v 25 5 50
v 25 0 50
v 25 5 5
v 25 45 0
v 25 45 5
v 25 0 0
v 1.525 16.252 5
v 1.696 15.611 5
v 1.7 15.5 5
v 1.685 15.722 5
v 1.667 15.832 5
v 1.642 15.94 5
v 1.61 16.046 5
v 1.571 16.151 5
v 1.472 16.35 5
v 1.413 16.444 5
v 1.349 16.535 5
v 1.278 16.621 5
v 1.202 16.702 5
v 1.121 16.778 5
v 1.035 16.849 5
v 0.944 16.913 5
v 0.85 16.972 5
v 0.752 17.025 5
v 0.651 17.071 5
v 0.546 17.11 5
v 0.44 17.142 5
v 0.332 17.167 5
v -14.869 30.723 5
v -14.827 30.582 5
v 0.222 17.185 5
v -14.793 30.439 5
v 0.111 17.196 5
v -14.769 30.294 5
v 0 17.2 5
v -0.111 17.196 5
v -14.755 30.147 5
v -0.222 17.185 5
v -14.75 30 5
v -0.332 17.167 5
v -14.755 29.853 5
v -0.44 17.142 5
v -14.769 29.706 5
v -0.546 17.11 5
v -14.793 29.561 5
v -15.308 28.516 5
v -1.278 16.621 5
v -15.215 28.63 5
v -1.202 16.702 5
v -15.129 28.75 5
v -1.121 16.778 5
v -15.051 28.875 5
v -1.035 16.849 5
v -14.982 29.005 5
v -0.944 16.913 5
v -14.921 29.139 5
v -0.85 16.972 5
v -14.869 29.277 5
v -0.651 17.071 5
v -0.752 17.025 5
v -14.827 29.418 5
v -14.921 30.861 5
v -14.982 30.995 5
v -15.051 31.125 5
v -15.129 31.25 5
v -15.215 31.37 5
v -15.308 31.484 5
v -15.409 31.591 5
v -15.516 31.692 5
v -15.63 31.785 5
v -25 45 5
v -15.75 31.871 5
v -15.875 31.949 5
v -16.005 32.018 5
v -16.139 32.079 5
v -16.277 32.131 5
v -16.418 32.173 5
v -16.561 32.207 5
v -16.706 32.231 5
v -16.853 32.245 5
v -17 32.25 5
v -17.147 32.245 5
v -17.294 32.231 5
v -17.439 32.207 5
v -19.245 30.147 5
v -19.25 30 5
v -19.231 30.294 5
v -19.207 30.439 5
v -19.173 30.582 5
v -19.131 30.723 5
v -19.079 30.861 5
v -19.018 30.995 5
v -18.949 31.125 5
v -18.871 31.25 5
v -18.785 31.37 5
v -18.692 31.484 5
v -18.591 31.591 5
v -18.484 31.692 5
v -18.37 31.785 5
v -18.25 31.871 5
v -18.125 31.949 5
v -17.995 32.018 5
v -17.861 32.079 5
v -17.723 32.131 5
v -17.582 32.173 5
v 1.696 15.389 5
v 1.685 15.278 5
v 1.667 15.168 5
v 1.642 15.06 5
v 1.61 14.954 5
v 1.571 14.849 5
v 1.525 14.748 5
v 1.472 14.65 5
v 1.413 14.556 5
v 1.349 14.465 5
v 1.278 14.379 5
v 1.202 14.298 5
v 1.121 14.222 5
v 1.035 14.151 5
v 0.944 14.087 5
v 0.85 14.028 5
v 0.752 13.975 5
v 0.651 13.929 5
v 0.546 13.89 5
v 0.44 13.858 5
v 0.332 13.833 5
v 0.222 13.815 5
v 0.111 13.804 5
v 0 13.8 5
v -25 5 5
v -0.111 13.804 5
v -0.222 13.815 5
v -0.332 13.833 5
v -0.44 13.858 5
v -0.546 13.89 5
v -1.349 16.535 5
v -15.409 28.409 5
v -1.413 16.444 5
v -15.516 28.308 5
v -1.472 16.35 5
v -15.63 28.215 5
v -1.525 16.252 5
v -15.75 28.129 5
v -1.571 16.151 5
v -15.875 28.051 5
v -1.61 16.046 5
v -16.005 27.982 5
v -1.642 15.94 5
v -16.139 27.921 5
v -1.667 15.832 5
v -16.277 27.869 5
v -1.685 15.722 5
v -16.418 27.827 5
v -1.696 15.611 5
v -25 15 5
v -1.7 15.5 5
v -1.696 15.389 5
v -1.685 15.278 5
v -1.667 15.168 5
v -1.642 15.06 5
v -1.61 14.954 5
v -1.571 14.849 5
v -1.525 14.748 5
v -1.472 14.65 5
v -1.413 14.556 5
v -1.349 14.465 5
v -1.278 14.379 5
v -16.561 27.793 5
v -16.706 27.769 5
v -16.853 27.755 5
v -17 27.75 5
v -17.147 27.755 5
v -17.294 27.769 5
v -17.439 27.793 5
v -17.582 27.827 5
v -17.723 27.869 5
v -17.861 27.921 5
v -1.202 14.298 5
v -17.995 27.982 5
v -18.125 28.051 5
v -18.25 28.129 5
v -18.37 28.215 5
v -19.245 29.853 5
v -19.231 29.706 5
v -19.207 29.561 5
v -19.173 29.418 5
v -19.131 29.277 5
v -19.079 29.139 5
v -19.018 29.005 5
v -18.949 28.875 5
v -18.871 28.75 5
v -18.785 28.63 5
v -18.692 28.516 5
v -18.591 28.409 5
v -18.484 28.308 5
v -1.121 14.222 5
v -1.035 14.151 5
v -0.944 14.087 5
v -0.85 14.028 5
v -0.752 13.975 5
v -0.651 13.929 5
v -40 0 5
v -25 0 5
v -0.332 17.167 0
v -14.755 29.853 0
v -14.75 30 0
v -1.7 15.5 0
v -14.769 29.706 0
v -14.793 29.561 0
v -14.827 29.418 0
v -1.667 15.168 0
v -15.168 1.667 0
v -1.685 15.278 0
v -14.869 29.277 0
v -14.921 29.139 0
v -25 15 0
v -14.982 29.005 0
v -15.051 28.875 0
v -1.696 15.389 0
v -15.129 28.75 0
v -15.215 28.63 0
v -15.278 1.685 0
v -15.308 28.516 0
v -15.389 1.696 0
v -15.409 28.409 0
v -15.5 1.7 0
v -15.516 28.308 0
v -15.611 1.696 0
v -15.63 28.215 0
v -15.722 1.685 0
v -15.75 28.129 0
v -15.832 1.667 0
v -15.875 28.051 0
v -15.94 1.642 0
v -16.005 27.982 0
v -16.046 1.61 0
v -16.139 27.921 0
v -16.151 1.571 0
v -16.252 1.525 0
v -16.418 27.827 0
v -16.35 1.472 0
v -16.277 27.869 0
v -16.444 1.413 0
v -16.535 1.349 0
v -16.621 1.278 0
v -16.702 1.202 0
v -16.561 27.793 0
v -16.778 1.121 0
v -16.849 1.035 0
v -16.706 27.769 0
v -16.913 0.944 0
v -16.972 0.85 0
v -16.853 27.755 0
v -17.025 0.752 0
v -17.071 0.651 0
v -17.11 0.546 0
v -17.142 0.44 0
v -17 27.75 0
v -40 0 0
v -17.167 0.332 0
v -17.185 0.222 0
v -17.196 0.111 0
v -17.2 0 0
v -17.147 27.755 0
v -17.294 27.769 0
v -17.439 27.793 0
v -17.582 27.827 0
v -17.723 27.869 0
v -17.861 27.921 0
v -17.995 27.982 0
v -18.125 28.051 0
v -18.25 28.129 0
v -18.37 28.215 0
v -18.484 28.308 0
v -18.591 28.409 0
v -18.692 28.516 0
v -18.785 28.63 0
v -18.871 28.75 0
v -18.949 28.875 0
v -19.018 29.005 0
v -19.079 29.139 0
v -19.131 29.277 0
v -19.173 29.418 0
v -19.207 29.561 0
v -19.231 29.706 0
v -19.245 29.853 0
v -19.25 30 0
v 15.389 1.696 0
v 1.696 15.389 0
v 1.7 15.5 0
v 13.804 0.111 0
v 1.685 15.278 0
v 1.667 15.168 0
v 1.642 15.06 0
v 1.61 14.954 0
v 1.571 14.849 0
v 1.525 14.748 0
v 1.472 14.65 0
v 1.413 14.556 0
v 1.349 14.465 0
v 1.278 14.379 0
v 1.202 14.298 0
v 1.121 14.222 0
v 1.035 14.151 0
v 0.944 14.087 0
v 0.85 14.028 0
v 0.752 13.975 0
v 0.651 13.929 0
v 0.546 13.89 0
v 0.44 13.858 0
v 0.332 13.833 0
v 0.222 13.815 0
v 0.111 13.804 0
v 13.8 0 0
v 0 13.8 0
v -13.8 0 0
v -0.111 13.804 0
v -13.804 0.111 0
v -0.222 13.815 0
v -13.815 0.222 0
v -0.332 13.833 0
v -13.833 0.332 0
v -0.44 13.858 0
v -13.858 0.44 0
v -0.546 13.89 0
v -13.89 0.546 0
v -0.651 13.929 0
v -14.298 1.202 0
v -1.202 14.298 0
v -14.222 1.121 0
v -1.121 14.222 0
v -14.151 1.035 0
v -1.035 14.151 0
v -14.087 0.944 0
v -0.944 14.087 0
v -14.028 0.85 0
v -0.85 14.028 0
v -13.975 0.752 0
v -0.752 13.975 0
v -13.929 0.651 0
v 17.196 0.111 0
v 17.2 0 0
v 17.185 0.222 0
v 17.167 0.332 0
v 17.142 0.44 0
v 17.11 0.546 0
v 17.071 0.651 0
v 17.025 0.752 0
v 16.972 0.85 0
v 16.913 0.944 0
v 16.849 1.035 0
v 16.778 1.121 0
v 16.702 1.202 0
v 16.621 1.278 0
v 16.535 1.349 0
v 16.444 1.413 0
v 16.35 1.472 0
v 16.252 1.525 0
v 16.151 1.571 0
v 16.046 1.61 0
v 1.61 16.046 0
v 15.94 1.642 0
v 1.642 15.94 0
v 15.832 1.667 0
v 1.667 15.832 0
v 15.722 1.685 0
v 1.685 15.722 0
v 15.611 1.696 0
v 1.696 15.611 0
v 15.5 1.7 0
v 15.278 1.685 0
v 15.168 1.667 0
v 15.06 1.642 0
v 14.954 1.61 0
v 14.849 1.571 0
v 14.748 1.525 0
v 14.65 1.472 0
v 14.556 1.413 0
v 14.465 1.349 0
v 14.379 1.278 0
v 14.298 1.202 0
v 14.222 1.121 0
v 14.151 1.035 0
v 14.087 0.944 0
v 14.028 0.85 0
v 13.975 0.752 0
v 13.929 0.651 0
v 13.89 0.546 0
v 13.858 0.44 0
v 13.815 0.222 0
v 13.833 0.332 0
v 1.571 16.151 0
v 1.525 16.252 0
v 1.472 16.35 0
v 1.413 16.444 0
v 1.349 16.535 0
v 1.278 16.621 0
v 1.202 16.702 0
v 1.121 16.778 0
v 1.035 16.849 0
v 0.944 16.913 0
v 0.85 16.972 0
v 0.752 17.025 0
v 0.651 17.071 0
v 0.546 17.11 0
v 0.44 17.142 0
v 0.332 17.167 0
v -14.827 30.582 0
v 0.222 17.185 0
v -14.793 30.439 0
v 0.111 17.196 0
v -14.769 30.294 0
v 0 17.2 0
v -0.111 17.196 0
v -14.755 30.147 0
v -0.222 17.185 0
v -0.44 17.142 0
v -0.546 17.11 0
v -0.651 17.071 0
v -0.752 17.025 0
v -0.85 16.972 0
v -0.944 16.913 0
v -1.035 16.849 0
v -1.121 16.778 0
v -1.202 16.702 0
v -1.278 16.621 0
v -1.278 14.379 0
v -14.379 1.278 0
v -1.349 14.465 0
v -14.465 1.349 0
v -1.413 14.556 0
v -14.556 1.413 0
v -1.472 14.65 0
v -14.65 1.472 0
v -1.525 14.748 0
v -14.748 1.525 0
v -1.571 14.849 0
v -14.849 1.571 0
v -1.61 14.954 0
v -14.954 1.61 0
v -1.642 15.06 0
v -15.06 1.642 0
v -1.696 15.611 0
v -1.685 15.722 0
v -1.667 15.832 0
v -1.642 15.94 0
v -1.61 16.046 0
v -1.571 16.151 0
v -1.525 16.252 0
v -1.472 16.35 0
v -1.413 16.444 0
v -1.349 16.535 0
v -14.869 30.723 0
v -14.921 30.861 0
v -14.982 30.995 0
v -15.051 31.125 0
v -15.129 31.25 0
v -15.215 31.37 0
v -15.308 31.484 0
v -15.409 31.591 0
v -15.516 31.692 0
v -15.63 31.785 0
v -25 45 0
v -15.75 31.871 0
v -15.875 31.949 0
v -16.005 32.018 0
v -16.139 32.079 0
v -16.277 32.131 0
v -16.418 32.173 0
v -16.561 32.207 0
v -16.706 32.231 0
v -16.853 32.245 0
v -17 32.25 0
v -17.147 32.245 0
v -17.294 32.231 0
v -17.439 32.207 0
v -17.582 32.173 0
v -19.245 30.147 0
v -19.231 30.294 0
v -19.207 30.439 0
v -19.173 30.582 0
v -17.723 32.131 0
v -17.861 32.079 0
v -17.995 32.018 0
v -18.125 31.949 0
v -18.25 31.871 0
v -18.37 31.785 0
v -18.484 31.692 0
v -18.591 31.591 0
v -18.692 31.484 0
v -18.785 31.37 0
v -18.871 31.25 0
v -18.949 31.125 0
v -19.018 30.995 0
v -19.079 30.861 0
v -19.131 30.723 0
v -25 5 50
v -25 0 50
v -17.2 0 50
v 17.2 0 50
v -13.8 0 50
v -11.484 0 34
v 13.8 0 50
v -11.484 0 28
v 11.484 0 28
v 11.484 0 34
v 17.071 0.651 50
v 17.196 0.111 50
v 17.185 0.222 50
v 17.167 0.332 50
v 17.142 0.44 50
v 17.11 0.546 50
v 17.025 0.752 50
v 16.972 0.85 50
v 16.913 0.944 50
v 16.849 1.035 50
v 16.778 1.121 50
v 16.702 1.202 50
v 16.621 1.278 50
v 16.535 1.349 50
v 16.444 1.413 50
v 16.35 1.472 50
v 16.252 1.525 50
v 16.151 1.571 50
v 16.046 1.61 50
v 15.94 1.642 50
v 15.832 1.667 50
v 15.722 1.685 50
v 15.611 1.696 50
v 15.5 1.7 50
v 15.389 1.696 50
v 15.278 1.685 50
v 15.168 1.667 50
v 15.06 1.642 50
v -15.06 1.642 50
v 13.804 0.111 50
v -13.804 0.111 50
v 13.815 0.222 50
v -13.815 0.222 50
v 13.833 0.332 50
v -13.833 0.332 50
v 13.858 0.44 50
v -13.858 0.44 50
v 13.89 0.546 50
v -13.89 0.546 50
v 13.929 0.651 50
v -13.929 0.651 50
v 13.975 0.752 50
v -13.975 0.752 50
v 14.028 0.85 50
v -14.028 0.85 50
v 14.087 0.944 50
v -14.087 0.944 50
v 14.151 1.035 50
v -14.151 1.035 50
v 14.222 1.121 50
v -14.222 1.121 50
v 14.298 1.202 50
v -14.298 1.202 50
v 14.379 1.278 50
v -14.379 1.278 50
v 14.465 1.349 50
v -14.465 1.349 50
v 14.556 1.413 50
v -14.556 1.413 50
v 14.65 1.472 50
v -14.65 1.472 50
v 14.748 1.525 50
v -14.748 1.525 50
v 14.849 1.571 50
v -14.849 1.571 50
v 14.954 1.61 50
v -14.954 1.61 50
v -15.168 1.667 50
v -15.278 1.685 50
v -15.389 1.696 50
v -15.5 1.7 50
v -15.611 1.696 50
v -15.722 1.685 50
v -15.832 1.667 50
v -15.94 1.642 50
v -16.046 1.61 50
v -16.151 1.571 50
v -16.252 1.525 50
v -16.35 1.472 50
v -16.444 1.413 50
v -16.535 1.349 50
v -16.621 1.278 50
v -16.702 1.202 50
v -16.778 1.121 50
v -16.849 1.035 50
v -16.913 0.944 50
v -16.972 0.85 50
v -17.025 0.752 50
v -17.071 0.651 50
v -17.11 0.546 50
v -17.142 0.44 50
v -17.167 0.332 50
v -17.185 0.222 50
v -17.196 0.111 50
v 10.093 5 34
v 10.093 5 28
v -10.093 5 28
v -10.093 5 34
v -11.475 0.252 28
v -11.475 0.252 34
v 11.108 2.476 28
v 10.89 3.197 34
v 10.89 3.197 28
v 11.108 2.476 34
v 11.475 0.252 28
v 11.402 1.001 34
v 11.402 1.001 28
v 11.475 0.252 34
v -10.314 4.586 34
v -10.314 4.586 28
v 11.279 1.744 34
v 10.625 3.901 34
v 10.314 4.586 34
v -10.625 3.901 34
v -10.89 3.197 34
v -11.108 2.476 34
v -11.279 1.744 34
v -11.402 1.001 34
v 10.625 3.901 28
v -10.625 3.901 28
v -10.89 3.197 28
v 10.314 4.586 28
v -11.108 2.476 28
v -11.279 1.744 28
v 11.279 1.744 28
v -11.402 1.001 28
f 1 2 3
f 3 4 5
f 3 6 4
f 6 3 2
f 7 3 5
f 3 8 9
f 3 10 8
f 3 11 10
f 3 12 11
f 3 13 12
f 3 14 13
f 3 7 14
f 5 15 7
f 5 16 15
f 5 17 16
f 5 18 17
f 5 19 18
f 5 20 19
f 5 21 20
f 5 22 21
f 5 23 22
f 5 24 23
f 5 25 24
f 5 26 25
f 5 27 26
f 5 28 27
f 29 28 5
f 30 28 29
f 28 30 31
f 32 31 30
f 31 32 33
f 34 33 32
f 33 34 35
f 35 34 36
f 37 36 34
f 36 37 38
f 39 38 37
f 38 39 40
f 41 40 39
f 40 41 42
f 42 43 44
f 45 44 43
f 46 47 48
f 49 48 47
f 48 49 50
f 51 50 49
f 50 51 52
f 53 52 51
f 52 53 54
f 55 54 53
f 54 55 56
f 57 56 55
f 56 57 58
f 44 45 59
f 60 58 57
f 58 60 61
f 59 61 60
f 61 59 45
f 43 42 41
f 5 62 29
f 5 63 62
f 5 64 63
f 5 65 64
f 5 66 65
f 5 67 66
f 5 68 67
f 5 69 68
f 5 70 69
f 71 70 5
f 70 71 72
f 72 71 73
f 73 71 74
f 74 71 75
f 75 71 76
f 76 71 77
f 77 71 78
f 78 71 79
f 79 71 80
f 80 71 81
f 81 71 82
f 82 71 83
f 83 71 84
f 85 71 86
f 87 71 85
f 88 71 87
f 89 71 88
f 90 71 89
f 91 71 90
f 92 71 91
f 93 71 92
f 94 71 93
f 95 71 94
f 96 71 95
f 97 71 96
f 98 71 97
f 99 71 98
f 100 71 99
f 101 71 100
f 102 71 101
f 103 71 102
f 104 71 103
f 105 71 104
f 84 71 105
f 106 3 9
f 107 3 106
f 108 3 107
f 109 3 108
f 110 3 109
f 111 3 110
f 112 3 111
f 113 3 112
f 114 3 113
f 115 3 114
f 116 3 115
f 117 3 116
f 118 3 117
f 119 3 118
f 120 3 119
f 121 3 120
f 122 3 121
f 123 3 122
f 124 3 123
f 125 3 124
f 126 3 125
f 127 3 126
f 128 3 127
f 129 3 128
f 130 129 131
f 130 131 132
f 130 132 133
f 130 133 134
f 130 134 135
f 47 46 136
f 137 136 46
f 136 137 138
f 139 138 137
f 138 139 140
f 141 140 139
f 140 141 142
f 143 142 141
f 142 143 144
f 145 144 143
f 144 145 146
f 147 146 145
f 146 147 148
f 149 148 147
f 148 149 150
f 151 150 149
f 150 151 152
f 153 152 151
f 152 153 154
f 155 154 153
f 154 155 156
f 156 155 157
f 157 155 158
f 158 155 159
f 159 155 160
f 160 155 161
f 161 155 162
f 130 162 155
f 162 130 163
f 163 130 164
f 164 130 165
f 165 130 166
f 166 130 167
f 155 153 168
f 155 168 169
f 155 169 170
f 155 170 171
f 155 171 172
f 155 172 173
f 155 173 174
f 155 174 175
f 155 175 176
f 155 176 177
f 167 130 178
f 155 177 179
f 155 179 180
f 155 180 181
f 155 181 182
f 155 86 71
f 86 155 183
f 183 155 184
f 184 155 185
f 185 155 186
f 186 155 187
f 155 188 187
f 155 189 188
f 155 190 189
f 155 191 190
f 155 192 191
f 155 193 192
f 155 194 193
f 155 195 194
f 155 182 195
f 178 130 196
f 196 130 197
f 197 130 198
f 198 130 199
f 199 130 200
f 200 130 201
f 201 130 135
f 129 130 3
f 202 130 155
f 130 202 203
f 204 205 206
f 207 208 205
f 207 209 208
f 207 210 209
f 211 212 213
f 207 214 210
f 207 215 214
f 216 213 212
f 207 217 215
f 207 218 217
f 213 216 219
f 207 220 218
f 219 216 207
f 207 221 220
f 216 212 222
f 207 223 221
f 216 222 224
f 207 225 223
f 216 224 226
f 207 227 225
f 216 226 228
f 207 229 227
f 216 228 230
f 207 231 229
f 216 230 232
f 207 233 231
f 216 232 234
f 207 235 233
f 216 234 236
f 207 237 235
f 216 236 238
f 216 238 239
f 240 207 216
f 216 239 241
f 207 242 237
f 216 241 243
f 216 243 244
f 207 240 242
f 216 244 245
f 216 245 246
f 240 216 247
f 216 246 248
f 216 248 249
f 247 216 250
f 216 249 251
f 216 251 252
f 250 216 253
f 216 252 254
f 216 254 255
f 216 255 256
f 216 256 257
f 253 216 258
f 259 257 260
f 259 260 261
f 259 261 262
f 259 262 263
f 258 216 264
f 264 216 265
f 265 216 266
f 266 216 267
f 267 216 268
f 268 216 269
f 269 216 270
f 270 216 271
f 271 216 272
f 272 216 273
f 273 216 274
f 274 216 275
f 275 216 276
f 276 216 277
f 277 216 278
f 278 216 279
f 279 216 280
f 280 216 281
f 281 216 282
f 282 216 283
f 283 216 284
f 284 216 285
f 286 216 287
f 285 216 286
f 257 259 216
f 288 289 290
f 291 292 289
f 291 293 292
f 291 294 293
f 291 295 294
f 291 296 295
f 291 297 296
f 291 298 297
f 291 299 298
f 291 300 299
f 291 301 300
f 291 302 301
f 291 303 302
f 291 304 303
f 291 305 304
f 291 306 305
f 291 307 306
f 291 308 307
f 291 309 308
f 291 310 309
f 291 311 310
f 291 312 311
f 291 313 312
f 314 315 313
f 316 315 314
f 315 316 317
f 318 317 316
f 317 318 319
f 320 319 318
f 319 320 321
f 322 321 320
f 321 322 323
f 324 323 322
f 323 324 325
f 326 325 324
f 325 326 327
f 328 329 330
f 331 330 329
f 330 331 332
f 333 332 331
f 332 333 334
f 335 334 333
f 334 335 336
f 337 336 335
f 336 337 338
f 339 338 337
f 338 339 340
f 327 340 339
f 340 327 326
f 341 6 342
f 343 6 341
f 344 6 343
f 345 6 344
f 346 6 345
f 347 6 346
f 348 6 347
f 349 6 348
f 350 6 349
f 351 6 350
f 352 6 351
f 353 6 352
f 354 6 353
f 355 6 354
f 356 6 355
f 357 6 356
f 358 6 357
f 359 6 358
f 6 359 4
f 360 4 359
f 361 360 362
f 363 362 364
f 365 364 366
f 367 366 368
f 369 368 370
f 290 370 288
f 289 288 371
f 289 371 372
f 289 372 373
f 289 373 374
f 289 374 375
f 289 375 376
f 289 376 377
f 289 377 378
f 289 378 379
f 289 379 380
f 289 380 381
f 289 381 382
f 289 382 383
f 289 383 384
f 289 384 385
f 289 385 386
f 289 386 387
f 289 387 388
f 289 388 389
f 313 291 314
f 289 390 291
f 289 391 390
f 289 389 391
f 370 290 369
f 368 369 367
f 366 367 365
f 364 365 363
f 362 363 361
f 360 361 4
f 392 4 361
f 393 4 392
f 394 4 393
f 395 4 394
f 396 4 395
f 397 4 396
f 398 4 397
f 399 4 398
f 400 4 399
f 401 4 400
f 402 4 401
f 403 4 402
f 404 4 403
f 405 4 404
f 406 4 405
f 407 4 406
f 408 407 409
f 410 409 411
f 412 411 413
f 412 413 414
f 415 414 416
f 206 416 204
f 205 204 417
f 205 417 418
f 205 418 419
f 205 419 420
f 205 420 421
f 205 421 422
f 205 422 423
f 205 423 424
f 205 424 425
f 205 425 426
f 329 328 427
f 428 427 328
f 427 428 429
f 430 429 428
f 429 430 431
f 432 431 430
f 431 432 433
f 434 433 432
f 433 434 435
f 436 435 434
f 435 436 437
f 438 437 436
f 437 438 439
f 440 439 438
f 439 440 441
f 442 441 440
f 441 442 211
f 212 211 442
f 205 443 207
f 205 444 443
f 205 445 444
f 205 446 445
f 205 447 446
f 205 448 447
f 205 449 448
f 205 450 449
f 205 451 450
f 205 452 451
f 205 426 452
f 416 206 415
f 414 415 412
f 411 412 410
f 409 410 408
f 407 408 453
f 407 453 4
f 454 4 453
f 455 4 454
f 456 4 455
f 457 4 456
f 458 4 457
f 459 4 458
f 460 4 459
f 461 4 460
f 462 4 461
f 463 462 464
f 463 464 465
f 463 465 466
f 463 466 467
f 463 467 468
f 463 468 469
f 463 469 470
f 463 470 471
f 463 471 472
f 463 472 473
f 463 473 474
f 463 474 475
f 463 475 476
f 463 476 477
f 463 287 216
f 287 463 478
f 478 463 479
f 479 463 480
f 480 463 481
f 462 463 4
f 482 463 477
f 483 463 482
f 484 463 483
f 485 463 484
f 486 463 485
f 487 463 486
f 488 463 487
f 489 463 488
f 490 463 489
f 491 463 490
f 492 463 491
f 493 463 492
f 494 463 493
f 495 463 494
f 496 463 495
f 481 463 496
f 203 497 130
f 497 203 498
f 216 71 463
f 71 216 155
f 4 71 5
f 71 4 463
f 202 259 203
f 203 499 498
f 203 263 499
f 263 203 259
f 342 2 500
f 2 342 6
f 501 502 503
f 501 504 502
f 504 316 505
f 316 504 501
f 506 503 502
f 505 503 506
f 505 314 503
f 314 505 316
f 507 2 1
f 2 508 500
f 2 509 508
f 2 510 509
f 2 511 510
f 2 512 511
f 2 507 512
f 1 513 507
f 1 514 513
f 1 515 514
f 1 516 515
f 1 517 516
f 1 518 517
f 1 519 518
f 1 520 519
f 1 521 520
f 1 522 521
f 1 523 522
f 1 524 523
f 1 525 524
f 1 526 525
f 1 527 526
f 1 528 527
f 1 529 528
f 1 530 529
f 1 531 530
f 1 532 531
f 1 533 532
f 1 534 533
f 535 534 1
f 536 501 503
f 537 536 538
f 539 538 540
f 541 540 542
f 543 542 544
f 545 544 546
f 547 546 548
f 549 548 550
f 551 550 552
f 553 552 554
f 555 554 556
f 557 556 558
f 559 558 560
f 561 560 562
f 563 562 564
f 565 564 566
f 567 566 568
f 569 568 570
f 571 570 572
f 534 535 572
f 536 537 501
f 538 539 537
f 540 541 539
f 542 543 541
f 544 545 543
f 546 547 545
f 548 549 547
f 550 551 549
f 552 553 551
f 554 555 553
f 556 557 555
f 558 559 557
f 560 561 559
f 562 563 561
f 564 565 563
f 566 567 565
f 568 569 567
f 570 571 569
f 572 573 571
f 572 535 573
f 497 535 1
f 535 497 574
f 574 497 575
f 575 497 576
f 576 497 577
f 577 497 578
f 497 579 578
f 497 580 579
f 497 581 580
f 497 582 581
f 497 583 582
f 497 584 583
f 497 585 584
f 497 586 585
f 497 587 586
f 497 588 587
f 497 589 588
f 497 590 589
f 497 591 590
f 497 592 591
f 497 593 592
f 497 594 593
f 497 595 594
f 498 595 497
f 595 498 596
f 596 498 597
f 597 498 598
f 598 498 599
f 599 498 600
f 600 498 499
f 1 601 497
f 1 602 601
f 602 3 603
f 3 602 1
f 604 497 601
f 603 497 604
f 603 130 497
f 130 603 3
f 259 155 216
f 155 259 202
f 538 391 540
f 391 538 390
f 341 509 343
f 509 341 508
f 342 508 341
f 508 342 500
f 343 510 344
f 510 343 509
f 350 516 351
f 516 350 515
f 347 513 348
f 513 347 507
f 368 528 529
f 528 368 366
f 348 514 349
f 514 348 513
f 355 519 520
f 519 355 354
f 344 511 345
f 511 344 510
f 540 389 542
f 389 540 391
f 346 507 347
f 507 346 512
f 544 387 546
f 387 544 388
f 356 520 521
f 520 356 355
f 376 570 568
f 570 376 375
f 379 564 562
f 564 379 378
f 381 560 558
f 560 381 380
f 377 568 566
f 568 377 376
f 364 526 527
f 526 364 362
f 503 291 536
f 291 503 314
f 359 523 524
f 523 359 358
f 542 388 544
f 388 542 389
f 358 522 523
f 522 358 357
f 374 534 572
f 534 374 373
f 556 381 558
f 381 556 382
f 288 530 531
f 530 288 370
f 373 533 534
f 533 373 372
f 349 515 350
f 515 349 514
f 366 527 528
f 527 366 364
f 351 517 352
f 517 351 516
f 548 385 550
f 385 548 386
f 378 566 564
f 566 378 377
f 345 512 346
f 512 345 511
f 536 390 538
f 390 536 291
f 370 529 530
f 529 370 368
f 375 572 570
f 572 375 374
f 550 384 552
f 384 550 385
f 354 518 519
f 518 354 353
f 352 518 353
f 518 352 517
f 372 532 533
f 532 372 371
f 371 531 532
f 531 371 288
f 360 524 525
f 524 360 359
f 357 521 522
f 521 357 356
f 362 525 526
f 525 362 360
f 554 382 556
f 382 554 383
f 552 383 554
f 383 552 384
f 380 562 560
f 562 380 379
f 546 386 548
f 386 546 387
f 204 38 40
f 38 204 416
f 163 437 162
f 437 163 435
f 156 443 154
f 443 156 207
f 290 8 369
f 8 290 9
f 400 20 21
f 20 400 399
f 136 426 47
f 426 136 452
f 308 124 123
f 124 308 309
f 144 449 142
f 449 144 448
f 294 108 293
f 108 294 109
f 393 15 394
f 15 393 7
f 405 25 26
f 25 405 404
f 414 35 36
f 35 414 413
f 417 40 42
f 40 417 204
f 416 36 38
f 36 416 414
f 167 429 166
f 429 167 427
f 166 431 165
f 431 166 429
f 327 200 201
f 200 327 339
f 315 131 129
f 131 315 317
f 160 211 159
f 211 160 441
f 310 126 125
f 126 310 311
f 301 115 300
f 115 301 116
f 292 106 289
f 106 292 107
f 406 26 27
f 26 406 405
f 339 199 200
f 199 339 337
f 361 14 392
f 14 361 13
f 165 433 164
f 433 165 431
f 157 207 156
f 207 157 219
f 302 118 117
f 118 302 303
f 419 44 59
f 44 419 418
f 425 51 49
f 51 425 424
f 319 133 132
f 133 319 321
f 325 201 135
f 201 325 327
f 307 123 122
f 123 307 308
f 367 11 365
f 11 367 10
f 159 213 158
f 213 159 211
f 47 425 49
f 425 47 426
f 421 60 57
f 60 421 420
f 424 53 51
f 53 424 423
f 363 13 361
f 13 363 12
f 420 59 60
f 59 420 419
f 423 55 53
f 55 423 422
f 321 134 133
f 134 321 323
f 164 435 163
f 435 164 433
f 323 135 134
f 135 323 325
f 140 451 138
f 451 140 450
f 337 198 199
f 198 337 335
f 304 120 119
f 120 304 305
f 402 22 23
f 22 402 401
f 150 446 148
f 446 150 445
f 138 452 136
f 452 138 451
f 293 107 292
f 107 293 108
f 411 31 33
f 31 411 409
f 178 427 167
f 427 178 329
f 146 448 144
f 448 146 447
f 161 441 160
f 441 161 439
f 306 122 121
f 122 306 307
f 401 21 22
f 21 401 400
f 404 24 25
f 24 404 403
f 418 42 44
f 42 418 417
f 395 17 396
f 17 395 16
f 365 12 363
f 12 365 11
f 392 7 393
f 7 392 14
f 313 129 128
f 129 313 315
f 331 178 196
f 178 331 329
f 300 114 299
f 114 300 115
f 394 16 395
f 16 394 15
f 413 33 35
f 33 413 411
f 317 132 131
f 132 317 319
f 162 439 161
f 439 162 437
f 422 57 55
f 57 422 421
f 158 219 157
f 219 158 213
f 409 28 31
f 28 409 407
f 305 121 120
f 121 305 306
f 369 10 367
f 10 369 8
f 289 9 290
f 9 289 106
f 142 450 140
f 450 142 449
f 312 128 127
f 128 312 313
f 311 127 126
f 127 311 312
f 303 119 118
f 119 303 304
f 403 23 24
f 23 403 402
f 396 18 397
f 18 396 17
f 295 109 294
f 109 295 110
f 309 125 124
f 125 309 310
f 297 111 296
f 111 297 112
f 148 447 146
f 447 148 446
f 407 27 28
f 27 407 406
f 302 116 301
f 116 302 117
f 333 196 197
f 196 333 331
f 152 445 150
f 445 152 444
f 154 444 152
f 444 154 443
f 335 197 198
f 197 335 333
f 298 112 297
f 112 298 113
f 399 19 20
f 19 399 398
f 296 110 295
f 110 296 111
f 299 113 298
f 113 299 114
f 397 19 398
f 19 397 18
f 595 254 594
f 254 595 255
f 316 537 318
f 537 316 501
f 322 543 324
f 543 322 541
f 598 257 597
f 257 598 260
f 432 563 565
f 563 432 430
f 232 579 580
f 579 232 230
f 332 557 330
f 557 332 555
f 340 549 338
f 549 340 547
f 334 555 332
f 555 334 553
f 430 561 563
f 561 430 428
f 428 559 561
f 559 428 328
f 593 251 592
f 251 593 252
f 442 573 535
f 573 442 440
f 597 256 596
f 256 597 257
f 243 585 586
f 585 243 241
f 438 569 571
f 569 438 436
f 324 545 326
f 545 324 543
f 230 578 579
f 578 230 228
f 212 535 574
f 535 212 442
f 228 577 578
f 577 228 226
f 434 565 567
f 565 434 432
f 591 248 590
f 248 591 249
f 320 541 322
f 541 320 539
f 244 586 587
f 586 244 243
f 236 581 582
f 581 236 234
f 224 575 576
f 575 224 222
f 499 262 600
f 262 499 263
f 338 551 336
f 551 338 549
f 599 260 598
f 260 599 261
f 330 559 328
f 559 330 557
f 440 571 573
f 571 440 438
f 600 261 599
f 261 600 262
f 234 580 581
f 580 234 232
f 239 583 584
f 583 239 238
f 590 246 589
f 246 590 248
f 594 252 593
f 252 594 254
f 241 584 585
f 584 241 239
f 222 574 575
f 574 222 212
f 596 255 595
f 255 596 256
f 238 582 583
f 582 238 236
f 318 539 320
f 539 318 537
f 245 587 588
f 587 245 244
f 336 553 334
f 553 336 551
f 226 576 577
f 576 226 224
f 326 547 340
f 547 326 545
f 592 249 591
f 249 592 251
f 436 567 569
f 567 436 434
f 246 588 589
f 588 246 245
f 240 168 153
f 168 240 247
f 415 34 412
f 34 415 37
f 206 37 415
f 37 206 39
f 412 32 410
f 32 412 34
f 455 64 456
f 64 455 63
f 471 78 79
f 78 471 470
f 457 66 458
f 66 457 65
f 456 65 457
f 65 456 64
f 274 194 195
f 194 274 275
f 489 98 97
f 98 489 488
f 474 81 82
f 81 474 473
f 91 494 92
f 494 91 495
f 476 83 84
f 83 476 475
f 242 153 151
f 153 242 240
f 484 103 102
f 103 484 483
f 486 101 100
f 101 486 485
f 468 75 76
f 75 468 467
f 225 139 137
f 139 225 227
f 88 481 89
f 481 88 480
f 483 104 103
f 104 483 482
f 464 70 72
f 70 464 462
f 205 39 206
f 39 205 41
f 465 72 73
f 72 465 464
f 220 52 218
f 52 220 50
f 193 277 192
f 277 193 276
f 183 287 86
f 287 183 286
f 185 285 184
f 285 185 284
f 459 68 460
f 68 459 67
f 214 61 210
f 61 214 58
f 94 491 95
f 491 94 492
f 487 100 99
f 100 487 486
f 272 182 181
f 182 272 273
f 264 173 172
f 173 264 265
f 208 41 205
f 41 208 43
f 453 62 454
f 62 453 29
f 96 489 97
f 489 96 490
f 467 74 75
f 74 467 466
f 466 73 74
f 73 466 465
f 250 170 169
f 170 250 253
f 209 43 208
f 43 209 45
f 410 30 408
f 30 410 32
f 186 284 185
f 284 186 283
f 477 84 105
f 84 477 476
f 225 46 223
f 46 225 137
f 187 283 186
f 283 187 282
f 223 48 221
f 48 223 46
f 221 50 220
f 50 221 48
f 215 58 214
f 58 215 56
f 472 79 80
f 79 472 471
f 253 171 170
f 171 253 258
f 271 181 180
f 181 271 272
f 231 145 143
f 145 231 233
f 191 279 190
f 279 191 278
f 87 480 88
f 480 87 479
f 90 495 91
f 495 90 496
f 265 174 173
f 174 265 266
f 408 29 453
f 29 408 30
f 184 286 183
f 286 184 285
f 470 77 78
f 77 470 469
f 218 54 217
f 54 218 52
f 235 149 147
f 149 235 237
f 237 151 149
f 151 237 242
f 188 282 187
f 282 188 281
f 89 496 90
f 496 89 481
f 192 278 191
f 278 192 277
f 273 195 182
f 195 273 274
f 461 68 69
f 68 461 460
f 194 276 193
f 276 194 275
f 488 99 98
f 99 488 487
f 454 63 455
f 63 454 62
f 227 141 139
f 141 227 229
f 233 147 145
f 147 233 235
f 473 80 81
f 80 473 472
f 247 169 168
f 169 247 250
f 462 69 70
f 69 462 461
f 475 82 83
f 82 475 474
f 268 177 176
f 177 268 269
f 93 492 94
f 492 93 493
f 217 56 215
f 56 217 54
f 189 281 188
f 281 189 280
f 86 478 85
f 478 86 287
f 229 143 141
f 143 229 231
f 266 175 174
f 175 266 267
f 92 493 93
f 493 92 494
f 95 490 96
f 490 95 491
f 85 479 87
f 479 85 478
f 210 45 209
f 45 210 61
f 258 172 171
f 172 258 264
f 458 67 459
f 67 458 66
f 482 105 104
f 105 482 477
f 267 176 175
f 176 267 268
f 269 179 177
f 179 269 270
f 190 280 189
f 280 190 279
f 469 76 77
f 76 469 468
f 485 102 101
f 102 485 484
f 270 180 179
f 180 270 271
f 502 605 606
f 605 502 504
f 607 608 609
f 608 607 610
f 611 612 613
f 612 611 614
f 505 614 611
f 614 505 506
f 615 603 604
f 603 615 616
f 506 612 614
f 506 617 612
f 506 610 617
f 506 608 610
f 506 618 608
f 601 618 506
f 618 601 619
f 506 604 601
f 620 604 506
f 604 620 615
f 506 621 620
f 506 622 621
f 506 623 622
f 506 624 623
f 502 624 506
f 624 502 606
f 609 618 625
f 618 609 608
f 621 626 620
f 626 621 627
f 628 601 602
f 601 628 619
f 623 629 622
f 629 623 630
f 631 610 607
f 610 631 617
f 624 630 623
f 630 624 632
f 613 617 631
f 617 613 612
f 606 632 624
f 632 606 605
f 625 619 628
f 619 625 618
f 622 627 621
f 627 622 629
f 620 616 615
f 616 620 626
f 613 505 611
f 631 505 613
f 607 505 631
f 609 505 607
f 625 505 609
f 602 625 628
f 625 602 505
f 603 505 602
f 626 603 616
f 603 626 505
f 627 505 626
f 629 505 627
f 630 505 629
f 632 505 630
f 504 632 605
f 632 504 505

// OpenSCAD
// L-shaped mounting bracket for NEMA 17 stepper motor
// Print orientation: base plate on bed (z = 0), motor plate builds upward (+Z)

// ---------------- Parameters ----------------
base_x0      = -25;    // base plate: x start
base_x1      = 25;     // base plate: x end
base_y0      = 0;      // base plate: y start
base_y1      = 45;     // base plate: y end
base_z0      = 0;      // base plate: z start
base_z1      = 5;      // base plate: z end

hole_x       = -17;    // M4 through-hole x position (base)
hole_y       = 30;     // M4 through-hole y position (base)
hole_d       = 4.5;    // M4 hole diameter

plate_x0     = -25;    // motor plate: x start
plate_x1     = 25;     // motor plate: x end
plate_y0     = 0;      // motor plate: y start
plate_y1     = 5;      // motor plate: y end
plate_z0     = 0;      // motor plate: z start
plate_z1     = 50;     // motor plate: z end

boss_d       = 23;     // motor centring boss hole diameter
boss_x       = 0;      // boss hole centre x
boss_z       = 28;     // boss hole centre z

screw_d      = 3.4;    // M3 screw hole diameter
screw_pitch  = 31;     // square pattern side length

gusset_t     = 5;      // gusset thickness (X direction)
gusset_leg   = 20;     // right triangle leg length (Y and Z)
gusset_x0    = -25;    // left gusset x start
gusset_x1    = -20;    // left gusset x end

eps          = 0.5;    // cutter overshoot past faces

$fn = 96;

// ---------------- Model ----------------
difference() {
    union() {
        // Base plate
        translate([base_x0, base_y0, base_z0])
            cube([base_x1 - base_x0, base_y1 - base_y0, base_z1 - base_z0]);

        // Motor plate
        translate([plate_x0, plate_y0, plate_z0])
            cube([plate_x1 - plate_x0, plate_y1 - plate_y0, plate_z1 - plate_z0]);

        // Left gusset (flush with left edge)
        translate([gusset_x0, 0, 0])
            linear_extrude(height = gusset_t)
                polygon(points = [
                    [0, 0],
                    [gusset_leg, 0],
                    [0, gusset_leg]
                ]);

        // Right gusset (flush with right edge)
        translate([gusset_x1, 0, 0])
            linear_extrude(height = gusset_t)
                polygon(points = [
                    [0, 0],
                    [-gusset_leg, 0],
                    [0, gusset_leg]
                ]);
    }

    // Base plate through-holes (M4)
    translate([hole_x, hole_y, -eps])
        cylinder(d = hole_d, h = base_z1 - base_z0 + 2 * eps);

    // Motor boss hole (through along Y)
    translate([boss_x, plate_y0 - eps, boss_z])
        cylinder(d = boss_d, h = plate_y1 - plate_y0 + 2 * eps);

    // M3 screw holes on square pattern centred on boss hole
    for (a = [0, 90, 180, 270])
        rotate([0, 0, a])
            translate([screw_pitch / 2, 0, -eps])
                cylinder(d = screw_d, h = plate_z1 - plate_z0 + 2 * eps);
}
